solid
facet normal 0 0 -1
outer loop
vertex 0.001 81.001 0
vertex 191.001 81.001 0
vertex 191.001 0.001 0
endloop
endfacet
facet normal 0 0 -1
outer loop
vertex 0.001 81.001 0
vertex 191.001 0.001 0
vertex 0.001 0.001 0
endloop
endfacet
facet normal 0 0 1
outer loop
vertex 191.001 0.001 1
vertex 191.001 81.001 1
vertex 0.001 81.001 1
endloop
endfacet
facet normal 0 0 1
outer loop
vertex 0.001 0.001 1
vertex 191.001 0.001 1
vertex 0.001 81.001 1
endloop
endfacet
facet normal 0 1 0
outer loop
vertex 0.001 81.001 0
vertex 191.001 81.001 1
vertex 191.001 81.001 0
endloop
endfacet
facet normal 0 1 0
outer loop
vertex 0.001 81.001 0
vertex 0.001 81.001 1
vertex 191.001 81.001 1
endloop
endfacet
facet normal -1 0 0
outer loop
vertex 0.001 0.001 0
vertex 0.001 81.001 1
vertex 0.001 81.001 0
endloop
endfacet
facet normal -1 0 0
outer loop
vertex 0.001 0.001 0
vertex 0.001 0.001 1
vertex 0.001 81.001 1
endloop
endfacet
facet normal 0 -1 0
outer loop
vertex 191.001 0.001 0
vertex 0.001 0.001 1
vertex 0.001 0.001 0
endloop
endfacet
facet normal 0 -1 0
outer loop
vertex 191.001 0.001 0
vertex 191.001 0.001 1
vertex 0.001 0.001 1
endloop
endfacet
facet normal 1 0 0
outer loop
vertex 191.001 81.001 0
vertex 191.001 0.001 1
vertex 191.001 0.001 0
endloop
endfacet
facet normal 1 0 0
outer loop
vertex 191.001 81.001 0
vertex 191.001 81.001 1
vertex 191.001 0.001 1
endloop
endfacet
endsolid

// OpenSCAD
render()
linear_extrude(1)
difference() {
  translate([0.001, 0.001])
  square([191, 81]);
  
  projection(cut=true)
  translate([0, 0, -50])
  surface("scan4.png");
}
